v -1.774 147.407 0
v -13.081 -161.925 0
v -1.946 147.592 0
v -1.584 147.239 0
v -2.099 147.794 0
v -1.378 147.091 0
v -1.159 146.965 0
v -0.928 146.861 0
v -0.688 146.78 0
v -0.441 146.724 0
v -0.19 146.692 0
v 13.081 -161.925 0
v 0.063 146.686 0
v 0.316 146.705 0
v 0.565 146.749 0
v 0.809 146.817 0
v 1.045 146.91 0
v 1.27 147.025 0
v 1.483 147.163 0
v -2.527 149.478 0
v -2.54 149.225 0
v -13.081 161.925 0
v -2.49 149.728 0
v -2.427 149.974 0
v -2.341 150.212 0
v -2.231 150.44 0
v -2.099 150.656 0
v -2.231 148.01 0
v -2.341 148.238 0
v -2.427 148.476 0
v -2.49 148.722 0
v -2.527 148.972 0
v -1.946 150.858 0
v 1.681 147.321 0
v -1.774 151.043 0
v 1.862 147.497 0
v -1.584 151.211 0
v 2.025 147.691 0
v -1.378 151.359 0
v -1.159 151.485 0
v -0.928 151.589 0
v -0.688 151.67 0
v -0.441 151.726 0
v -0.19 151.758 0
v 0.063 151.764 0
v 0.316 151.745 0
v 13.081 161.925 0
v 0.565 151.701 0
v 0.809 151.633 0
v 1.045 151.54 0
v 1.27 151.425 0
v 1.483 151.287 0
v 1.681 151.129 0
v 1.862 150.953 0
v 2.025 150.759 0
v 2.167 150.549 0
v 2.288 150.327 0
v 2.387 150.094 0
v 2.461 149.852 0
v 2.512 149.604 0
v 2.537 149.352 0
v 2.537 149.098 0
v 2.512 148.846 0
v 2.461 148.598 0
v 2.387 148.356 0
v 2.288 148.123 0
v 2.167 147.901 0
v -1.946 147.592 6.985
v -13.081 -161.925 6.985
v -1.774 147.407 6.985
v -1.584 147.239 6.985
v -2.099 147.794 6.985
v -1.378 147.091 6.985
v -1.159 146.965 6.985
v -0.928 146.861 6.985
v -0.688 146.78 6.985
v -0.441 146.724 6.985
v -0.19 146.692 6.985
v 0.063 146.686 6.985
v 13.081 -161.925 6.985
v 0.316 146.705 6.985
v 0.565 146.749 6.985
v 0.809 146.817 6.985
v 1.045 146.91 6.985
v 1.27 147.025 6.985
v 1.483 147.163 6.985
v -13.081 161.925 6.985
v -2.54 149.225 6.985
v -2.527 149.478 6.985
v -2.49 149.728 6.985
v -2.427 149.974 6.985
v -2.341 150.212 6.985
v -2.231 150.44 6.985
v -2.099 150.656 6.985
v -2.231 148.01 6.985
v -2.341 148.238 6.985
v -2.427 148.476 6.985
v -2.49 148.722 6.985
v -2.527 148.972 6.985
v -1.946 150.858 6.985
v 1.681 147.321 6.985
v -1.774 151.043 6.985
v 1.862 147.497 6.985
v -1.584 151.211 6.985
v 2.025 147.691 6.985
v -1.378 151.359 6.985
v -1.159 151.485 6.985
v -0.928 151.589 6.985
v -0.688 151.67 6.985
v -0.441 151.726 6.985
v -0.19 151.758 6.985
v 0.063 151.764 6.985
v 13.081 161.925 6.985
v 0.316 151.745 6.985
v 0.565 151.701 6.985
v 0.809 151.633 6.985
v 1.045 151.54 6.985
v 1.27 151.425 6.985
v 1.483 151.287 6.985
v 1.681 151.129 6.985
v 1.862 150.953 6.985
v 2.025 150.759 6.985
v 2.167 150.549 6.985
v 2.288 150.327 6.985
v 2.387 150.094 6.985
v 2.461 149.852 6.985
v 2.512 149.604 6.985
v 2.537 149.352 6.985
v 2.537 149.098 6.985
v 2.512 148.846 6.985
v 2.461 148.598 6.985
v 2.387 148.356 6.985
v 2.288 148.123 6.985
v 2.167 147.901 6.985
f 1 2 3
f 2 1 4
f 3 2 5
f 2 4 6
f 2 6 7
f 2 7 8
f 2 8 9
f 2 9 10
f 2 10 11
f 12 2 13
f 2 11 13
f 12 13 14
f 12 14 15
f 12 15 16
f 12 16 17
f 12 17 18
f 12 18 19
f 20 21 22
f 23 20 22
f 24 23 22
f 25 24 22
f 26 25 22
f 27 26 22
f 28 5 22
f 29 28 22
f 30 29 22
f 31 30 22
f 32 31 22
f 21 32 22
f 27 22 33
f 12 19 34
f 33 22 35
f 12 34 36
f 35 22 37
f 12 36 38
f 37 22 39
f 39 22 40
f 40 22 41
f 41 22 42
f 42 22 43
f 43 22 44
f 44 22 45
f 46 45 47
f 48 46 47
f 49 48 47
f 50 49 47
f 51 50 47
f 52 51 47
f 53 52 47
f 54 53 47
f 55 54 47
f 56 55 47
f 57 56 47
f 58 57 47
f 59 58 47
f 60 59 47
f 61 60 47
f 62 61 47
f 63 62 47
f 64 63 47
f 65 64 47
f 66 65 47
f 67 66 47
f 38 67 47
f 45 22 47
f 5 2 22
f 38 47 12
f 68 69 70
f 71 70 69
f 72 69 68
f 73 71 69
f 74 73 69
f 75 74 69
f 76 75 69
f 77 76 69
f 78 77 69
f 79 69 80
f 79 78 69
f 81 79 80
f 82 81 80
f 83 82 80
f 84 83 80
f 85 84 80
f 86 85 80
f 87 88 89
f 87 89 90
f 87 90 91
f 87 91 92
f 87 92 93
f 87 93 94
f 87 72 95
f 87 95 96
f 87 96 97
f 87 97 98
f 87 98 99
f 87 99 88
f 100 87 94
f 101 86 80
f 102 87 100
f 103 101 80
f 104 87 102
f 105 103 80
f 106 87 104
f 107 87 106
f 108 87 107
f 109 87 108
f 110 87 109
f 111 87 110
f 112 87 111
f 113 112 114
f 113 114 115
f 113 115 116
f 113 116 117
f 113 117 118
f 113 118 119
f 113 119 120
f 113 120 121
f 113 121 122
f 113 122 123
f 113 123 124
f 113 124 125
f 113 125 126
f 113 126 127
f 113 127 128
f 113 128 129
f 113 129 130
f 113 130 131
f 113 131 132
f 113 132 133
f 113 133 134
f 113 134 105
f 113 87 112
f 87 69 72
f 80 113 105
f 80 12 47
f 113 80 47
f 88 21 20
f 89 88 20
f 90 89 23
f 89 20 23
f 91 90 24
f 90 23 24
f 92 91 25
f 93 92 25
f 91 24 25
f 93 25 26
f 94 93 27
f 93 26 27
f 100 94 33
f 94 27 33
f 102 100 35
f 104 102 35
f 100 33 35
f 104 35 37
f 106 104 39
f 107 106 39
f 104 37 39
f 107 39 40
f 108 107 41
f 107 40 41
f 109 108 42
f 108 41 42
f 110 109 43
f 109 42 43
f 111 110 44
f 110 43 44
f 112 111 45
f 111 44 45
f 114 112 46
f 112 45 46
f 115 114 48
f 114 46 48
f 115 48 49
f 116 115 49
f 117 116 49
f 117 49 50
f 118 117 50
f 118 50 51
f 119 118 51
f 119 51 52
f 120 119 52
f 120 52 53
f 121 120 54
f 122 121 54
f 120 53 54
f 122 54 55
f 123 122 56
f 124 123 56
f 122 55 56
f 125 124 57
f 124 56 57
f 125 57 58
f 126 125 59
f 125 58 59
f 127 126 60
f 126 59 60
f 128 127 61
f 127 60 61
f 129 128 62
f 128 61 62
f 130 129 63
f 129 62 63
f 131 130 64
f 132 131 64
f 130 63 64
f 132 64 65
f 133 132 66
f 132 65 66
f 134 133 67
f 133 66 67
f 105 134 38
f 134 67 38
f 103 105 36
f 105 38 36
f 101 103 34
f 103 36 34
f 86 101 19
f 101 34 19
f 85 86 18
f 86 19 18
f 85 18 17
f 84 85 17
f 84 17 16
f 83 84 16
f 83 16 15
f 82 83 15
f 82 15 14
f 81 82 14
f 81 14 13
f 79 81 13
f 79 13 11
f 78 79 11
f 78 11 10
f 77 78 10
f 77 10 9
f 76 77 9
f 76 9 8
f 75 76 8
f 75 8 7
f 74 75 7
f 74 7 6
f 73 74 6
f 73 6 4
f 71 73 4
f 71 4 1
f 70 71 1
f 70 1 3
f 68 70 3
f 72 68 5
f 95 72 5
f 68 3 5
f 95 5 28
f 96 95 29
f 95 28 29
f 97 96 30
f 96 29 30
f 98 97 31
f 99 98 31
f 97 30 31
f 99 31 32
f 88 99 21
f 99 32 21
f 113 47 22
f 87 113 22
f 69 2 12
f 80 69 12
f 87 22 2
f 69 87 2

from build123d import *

# Parameters (mm, degrees)
F0_W     = 26.162
F0_H     = 12.7
F1_DEPTH = 6.985


with BuildPart() as f1:
    # F0 (on Top) → F1 (new body)
    with BuildSketch(Plane.XY):
        with BuildLine():
            Line((13.081, -149.225), (13.081, 149.225))
            Line((13.081, 149.225), (2.54, 149.225))
            ThreePointArc((2.54, 149.225), (0, 146.685), (-2.54, 149.225))
            Line((-2.54, 149.225), (-13.081, 149.225))
            Line((-13.081, 149.225), (-13.081, -149.225))
            Line((-13.081, -149.225), (13.081, -149.225))
        make_face()
        with BuildLine():
            Line((2.54, 149.225), (13.081, 149.225))
            Line((13.081, 149.225), (13.081, 161.925))
            Line((13.081, 161.925), (-13.081, 161.925))
            Line((-13.081, 161.925), (-13.081, 149.225))
            Line((-13.081, 149.225), (-2.54, 149.225))
            ThreePointArc((-2.54, 149.225), (0, 151.765), (2.54, 149.225))
        make_face()
        with Locations((0, -155.575)):
            Rectangle(F0_W, F0_H)
    extrude(amount=F1_DEPTH)


solid = f1.part
